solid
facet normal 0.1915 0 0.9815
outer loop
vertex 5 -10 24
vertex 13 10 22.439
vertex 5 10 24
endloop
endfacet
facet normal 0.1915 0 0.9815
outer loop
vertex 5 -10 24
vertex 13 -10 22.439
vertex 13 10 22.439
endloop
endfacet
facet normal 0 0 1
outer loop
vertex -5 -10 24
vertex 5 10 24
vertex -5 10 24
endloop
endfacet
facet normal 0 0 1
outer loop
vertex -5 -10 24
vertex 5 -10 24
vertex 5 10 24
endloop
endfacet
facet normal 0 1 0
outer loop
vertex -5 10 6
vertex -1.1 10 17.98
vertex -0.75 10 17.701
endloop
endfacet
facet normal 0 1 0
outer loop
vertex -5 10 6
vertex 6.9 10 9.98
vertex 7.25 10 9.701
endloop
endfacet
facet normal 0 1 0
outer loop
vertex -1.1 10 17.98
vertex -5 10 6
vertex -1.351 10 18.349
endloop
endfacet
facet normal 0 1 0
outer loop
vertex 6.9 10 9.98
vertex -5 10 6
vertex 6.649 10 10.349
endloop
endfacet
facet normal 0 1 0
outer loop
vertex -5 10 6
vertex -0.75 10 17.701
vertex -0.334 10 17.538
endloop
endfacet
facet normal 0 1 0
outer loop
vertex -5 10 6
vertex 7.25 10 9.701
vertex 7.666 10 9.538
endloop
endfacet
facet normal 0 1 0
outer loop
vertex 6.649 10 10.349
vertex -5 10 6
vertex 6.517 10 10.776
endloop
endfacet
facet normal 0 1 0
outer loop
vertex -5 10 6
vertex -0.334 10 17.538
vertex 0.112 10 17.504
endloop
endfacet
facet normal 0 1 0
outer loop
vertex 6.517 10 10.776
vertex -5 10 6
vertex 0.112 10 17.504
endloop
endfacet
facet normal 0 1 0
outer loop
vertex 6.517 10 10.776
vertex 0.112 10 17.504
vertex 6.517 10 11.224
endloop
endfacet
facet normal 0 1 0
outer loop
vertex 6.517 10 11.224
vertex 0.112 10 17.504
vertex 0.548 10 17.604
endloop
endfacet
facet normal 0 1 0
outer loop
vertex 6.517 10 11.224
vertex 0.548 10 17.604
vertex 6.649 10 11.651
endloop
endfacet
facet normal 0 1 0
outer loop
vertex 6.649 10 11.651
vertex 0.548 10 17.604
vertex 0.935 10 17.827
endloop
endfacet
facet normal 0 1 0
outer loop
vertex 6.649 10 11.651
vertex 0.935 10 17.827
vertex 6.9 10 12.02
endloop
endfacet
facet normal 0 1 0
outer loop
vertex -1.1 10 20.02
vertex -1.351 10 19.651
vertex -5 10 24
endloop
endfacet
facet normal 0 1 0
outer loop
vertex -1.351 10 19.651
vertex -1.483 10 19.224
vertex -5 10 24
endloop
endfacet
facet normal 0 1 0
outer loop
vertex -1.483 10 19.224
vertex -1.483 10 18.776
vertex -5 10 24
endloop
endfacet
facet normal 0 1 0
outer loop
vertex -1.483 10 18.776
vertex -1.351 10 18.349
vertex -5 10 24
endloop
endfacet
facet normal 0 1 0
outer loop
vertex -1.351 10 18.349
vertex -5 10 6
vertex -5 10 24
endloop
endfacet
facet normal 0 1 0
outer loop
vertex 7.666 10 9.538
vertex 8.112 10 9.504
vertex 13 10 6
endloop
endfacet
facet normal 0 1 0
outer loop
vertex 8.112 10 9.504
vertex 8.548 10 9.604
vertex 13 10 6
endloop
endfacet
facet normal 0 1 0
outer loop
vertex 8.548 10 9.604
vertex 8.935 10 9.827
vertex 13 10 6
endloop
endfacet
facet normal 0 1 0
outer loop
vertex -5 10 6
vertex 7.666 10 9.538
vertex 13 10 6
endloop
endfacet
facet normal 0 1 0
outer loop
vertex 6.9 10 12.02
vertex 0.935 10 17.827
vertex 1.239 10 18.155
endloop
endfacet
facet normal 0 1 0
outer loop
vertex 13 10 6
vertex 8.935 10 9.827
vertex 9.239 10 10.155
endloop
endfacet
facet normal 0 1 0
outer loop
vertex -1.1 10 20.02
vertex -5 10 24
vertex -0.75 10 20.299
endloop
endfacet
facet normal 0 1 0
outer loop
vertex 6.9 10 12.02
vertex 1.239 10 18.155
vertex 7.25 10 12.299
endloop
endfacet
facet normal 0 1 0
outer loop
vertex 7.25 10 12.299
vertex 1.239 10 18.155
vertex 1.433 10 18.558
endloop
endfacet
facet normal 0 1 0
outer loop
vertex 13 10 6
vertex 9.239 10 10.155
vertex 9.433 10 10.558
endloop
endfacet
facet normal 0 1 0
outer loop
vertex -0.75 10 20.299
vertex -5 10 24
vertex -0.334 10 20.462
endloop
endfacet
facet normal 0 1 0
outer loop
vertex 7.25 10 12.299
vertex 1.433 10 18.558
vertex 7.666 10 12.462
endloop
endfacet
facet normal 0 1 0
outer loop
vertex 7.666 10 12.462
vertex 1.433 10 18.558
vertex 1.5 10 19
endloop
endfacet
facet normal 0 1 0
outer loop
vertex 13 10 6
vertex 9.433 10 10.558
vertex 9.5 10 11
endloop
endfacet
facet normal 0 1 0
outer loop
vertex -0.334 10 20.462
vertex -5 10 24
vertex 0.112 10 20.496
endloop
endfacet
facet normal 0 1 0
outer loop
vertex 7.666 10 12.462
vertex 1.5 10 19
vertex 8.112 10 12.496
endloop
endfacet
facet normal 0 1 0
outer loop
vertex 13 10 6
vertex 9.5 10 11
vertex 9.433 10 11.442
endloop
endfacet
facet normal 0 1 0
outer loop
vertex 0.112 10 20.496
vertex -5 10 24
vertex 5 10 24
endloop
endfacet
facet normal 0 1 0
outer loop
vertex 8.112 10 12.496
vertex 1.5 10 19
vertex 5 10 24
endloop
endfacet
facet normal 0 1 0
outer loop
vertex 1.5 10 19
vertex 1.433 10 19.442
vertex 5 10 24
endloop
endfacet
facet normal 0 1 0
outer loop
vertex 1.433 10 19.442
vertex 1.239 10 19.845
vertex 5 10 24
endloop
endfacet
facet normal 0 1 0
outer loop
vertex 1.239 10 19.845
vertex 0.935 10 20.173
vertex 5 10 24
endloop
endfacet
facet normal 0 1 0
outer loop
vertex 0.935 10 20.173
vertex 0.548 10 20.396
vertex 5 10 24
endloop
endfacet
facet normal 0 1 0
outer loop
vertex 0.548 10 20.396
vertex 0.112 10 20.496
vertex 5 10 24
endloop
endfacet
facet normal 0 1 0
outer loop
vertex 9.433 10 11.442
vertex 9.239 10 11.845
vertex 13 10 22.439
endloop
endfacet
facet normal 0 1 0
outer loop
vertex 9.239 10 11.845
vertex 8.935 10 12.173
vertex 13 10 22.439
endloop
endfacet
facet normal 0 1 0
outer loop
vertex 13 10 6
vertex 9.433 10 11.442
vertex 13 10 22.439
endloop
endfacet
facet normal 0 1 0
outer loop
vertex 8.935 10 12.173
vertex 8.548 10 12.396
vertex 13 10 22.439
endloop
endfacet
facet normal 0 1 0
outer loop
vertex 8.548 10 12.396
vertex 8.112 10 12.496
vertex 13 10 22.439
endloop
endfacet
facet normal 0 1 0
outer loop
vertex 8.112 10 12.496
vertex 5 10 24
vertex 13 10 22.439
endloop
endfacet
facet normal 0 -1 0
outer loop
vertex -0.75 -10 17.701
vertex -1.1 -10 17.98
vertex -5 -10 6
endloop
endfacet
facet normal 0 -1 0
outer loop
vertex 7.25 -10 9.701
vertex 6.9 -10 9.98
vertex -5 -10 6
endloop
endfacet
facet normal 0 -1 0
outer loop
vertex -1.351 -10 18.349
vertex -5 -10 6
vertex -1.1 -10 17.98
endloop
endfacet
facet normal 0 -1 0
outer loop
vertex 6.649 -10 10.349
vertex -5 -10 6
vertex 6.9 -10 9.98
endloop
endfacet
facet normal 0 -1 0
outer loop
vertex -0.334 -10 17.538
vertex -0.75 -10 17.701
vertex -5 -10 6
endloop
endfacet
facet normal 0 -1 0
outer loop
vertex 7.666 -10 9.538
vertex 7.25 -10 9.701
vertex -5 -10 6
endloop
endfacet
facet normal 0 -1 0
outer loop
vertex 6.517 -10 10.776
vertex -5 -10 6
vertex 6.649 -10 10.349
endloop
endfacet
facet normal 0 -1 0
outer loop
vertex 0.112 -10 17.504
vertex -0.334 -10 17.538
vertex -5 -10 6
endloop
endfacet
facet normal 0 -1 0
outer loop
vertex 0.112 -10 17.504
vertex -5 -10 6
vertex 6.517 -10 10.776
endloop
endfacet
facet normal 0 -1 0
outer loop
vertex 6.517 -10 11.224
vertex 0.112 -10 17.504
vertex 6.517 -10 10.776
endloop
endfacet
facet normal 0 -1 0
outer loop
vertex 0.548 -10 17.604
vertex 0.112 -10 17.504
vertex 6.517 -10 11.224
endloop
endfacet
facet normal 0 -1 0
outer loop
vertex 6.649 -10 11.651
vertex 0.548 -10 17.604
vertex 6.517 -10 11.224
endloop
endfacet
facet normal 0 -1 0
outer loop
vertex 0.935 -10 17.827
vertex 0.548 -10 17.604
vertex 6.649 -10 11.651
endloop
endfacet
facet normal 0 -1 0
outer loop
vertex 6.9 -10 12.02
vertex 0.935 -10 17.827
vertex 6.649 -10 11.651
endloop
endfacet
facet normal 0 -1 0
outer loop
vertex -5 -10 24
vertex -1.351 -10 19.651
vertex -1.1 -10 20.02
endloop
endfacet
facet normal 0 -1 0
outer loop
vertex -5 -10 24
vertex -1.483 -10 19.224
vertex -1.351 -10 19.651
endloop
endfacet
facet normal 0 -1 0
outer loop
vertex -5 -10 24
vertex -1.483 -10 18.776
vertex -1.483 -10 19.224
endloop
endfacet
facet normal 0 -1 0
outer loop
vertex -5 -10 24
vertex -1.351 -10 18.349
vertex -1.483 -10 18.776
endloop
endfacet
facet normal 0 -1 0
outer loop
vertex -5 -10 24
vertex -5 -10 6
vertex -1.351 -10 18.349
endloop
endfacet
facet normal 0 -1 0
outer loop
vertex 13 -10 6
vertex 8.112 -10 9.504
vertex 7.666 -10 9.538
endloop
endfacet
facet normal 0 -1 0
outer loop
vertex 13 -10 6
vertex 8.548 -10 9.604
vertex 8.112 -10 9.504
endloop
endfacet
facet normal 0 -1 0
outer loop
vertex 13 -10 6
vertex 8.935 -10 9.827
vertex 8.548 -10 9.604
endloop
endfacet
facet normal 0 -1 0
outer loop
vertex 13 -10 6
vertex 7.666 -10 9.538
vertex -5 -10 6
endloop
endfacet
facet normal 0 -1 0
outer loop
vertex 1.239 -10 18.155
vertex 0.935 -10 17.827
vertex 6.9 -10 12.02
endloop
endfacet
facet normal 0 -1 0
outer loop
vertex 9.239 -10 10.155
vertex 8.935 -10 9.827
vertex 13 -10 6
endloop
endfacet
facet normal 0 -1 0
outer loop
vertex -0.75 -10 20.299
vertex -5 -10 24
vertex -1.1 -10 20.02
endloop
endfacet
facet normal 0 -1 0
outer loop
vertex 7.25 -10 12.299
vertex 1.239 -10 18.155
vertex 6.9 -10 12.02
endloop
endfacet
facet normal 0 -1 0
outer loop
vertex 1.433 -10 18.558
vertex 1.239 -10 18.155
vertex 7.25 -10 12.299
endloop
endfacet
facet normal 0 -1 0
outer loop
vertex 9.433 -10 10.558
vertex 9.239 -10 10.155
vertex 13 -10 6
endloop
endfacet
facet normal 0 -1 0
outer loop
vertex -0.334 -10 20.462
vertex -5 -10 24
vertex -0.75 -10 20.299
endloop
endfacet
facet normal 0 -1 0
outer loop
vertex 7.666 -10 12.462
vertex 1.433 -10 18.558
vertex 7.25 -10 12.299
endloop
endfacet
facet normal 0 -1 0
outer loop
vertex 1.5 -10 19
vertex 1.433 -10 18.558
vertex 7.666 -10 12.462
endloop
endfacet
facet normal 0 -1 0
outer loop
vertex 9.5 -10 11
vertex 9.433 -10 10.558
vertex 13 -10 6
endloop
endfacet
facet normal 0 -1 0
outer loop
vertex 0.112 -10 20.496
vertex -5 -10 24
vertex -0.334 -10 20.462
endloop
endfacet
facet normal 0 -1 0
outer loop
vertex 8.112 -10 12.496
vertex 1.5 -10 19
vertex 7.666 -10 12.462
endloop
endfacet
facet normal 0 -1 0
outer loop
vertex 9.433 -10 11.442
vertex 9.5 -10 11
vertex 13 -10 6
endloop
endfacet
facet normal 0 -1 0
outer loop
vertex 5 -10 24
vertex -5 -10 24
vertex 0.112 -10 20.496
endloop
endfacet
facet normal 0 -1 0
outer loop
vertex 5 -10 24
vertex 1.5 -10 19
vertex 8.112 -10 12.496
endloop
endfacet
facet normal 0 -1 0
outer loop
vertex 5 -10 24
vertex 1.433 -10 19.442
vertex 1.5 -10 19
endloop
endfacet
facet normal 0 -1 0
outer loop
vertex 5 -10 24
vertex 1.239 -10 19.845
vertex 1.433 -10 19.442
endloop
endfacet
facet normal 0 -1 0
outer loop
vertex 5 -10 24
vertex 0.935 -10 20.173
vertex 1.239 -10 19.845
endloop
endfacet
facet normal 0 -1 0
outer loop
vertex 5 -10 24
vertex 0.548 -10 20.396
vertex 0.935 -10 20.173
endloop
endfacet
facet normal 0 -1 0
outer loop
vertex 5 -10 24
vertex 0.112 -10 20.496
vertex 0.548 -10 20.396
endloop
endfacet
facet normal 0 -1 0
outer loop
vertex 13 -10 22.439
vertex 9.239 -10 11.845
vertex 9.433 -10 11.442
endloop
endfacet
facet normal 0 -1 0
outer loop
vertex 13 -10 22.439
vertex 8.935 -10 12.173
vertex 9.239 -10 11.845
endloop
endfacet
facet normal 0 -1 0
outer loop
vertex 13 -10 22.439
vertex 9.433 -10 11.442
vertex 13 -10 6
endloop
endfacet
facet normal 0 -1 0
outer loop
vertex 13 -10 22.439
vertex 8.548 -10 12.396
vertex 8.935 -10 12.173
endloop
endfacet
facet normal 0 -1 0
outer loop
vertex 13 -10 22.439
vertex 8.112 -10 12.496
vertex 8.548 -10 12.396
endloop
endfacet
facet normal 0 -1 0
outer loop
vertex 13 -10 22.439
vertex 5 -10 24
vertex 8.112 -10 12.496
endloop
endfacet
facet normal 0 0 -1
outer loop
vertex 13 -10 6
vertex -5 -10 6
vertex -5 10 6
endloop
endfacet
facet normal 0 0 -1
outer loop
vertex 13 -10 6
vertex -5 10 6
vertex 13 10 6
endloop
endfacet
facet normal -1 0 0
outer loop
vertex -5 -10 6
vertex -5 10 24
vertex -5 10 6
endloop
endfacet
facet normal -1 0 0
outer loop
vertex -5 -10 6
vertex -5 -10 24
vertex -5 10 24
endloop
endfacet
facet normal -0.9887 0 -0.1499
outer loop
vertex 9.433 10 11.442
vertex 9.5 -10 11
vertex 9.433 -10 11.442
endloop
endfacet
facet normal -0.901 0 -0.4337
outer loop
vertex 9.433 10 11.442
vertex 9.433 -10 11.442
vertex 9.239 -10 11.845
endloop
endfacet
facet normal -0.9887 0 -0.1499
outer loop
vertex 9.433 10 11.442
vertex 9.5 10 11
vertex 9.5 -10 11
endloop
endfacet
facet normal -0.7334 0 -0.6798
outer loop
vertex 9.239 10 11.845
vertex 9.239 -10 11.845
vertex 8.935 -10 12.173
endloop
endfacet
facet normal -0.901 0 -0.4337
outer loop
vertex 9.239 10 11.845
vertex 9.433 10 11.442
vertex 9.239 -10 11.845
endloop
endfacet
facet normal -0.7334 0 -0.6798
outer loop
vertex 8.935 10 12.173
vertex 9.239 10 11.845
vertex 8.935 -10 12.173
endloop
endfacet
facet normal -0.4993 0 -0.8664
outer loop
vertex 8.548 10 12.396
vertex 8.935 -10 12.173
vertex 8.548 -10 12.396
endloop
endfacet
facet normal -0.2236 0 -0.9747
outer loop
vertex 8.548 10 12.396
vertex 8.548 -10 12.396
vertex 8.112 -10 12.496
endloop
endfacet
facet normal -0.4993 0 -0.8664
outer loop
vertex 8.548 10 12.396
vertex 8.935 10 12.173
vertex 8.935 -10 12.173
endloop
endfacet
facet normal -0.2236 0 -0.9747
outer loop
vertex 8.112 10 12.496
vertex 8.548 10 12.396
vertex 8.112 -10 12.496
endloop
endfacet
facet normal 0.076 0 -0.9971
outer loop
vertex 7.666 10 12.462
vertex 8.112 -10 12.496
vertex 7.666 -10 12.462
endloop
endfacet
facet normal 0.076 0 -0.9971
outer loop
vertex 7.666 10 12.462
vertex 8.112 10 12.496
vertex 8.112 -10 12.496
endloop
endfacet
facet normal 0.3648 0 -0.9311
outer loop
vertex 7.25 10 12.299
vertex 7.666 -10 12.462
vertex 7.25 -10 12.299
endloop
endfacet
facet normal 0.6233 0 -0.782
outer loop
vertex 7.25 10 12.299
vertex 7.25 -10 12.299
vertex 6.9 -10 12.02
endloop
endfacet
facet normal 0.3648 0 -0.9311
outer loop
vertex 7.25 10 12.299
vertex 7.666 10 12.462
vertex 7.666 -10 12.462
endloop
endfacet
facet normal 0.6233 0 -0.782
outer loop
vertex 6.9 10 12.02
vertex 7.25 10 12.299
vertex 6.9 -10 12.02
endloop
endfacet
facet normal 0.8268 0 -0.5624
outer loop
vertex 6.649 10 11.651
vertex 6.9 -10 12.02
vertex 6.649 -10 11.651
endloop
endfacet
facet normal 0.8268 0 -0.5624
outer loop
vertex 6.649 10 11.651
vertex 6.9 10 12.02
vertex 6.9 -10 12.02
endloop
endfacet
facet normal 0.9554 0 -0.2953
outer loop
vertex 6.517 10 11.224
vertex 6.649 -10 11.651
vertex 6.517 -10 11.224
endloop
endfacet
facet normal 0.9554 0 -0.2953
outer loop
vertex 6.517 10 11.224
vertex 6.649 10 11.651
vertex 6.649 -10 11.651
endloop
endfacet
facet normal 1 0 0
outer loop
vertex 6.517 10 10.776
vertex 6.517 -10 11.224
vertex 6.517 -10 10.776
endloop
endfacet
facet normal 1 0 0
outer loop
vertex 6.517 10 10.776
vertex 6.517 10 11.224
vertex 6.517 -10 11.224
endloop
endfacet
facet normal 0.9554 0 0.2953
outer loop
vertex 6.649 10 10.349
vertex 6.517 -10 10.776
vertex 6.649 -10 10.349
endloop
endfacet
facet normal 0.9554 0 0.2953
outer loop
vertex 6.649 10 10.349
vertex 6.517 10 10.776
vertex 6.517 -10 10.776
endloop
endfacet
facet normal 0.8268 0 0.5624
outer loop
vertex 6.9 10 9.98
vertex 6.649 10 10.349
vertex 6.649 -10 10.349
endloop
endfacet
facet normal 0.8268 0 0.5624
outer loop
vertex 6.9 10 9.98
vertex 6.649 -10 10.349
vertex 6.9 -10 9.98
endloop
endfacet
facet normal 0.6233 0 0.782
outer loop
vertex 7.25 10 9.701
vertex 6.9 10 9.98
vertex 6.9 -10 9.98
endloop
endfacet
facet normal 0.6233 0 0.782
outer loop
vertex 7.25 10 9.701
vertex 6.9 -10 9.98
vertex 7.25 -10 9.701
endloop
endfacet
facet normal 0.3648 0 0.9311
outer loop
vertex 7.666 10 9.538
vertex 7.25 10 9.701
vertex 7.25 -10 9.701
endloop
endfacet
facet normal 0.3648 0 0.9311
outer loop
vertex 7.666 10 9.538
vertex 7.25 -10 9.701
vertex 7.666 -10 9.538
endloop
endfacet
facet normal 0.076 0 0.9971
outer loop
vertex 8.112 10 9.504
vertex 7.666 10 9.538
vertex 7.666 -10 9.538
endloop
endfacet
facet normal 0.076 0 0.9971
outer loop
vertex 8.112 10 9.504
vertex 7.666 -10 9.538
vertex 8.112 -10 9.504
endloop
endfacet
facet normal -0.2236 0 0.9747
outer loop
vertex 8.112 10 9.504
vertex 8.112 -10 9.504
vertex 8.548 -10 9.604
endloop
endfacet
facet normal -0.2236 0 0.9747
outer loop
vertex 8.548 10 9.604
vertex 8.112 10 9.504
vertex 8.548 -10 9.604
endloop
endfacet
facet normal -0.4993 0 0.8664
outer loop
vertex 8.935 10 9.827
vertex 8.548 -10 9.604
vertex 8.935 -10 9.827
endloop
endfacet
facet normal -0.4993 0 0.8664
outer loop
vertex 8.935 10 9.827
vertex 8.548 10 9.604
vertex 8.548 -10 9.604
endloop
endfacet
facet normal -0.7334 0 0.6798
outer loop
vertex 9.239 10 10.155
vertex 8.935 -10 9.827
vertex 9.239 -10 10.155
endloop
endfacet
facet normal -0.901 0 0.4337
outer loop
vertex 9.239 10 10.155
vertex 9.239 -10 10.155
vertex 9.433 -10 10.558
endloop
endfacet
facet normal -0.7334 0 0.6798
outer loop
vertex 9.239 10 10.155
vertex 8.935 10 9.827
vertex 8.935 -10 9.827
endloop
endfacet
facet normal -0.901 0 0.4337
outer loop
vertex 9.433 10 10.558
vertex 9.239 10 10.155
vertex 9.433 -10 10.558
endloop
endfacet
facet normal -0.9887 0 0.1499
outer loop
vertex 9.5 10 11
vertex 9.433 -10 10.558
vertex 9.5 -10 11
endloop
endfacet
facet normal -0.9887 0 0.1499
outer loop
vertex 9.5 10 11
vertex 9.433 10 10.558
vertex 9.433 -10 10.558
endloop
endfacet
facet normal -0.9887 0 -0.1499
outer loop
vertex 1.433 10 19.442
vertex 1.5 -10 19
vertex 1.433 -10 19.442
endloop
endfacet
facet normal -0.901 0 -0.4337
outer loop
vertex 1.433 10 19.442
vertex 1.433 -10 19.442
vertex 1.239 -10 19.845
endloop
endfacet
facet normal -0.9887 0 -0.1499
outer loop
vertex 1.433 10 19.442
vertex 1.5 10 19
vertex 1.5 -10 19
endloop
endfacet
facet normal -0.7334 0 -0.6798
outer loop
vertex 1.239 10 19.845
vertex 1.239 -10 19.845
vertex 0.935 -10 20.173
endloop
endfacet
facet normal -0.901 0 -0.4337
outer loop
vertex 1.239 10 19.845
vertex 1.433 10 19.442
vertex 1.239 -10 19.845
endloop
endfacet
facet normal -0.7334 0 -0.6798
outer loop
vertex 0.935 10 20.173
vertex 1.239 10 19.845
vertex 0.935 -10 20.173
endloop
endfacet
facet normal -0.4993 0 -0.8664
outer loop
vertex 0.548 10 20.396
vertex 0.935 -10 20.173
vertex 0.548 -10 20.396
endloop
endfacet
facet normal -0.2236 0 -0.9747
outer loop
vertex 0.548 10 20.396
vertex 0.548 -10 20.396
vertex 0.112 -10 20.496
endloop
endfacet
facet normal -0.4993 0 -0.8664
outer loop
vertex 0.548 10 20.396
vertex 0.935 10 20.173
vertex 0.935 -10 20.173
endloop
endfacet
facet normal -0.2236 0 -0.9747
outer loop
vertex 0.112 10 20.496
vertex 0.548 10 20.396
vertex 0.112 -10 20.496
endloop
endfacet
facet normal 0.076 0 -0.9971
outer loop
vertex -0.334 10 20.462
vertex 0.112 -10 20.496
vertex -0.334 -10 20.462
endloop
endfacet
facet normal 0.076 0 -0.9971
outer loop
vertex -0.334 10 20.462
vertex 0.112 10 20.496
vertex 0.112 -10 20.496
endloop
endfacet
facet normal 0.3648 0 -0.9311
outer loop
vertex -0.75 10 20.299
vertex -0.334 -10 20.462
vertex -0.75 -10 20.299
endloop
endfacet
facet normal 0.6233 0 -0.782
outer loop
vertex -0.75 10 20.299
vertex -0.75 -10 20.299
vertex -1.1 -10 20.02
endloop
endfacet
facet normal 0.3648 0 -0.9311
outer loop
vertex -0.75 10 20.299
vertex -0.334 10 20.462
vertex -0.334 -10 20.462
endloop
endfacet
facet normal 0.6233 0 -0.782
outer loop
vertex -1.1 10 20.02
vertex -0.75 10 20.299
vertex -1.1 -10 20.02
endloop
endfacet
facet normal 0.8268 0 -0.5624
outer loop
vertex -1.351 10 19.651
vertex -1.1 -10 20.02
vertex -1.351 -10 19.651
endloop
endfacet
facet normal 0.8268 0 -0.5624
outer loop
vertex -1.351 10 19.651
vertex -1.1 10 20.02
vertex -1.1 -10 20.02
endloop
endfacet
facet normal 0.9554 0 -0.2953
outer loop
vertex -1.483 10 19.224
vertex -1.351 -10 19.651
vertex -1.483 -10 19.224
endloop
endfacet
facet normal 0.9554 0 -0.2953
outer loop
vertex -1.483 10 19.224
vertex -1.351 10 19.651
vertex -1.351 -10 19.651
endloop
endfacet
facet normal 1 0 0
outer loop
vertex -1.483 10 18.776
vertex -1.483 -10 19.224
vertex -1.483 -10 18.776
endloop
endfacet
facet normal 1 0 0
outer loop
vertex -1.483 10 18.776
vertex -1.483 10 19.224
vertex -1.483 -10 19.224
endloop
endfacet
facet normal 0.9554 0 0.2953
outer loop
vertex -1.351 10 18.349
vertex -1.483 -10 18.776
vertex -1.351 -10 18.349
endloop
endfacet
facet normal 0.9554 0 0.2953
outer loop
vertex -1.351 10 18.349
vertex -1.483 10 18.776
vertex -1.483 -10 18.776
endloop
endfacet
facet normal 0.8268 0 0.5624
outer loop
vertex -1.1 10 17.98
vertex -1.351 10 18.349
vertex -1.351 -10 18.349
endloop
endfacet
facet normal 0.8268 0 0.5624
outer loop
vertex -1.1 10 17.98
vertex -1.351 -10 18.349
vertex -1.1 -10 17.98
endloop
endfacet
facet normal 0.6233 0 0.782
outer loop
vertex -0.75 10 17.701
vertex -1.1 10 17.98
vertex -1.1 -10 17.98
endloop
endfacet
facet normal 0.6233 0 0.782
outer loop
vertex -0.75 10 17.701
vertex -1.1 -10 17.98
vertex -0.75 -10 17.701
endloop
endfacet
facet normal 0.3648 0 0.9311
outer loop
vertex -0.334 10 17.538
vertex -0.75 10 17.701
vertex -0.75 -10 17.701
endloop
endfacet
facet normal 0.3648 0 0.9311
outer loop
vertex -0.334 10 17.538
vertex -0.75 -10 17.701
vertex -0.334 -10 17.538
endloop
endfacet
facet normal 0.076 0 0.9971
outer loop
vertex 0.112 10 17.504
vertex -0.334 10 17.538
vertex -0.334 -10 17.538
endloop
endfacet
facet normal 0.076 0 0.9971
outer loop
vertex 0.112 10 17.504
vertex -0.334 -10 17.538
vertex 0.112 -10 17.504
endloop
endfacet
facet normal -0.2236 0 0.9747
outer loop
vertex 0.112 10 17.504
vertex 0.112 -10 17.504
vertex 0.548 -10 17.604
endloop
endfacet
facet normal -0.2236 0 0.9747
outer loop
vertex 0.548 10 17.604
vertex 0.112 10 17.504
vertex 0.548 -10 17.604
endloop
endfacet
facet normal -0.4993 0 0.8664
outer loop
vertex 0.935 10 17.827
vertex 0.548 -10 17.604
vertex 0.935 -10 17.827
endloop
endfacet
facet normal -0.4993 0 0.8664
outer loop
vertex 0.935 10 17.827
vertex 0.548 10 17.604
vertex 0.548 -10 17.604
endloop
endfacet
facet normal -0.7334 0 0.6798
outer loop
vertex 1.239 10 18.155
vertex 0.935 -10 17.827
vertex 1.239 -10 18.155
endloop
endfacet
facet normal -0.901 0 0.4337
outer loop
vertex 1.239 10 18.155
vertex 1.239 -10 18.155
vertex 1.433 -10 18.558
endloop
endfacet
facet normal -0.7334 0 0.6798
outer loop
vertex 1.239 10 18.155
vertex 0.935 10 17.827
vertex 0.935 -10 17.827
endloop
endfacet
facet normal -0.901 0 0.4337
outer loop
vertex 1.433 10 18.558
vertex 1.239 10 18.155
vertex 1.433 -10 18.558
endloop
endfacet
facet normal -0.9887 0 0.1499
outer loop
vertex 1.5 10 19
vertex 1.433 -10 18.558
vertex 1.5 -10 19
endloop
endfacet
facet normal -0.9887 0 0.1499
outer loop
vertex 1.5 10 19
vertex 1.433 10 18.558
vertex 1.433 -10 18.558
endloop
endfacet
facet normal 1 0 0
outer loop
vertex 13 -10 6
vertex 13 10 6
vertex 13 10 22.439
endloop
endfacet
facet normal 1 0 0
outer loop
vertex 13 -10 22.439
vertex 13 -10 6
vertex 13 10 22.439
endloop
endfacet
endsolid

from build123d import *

# Parameters (mm, degrees)
F0_R     = 1.5
F1_DEPTH = 10


# Not quite as in the source:
# - a feature names something its author has since deleted; it is built from what else it names


with BuildPart() as f1:
    # F0 (on Front) → F1 (new body, symmetric)
    with BuildSketch(Plane.XZ):
        Polygon((-5, 24), (-5, 6), (13, 6), (13, 22.4390243902), (5, 24), align=None)
        with Locations((8, 11)):
            Circle(F0_R, mode=Mode.SUBTRACT)
        with Locations((0, 19)):
            Circle(F0_R, mode=Mode.SUBTRACT)
    extrude(amount=F1_DEPTH, both=True)


solid = f1.part
